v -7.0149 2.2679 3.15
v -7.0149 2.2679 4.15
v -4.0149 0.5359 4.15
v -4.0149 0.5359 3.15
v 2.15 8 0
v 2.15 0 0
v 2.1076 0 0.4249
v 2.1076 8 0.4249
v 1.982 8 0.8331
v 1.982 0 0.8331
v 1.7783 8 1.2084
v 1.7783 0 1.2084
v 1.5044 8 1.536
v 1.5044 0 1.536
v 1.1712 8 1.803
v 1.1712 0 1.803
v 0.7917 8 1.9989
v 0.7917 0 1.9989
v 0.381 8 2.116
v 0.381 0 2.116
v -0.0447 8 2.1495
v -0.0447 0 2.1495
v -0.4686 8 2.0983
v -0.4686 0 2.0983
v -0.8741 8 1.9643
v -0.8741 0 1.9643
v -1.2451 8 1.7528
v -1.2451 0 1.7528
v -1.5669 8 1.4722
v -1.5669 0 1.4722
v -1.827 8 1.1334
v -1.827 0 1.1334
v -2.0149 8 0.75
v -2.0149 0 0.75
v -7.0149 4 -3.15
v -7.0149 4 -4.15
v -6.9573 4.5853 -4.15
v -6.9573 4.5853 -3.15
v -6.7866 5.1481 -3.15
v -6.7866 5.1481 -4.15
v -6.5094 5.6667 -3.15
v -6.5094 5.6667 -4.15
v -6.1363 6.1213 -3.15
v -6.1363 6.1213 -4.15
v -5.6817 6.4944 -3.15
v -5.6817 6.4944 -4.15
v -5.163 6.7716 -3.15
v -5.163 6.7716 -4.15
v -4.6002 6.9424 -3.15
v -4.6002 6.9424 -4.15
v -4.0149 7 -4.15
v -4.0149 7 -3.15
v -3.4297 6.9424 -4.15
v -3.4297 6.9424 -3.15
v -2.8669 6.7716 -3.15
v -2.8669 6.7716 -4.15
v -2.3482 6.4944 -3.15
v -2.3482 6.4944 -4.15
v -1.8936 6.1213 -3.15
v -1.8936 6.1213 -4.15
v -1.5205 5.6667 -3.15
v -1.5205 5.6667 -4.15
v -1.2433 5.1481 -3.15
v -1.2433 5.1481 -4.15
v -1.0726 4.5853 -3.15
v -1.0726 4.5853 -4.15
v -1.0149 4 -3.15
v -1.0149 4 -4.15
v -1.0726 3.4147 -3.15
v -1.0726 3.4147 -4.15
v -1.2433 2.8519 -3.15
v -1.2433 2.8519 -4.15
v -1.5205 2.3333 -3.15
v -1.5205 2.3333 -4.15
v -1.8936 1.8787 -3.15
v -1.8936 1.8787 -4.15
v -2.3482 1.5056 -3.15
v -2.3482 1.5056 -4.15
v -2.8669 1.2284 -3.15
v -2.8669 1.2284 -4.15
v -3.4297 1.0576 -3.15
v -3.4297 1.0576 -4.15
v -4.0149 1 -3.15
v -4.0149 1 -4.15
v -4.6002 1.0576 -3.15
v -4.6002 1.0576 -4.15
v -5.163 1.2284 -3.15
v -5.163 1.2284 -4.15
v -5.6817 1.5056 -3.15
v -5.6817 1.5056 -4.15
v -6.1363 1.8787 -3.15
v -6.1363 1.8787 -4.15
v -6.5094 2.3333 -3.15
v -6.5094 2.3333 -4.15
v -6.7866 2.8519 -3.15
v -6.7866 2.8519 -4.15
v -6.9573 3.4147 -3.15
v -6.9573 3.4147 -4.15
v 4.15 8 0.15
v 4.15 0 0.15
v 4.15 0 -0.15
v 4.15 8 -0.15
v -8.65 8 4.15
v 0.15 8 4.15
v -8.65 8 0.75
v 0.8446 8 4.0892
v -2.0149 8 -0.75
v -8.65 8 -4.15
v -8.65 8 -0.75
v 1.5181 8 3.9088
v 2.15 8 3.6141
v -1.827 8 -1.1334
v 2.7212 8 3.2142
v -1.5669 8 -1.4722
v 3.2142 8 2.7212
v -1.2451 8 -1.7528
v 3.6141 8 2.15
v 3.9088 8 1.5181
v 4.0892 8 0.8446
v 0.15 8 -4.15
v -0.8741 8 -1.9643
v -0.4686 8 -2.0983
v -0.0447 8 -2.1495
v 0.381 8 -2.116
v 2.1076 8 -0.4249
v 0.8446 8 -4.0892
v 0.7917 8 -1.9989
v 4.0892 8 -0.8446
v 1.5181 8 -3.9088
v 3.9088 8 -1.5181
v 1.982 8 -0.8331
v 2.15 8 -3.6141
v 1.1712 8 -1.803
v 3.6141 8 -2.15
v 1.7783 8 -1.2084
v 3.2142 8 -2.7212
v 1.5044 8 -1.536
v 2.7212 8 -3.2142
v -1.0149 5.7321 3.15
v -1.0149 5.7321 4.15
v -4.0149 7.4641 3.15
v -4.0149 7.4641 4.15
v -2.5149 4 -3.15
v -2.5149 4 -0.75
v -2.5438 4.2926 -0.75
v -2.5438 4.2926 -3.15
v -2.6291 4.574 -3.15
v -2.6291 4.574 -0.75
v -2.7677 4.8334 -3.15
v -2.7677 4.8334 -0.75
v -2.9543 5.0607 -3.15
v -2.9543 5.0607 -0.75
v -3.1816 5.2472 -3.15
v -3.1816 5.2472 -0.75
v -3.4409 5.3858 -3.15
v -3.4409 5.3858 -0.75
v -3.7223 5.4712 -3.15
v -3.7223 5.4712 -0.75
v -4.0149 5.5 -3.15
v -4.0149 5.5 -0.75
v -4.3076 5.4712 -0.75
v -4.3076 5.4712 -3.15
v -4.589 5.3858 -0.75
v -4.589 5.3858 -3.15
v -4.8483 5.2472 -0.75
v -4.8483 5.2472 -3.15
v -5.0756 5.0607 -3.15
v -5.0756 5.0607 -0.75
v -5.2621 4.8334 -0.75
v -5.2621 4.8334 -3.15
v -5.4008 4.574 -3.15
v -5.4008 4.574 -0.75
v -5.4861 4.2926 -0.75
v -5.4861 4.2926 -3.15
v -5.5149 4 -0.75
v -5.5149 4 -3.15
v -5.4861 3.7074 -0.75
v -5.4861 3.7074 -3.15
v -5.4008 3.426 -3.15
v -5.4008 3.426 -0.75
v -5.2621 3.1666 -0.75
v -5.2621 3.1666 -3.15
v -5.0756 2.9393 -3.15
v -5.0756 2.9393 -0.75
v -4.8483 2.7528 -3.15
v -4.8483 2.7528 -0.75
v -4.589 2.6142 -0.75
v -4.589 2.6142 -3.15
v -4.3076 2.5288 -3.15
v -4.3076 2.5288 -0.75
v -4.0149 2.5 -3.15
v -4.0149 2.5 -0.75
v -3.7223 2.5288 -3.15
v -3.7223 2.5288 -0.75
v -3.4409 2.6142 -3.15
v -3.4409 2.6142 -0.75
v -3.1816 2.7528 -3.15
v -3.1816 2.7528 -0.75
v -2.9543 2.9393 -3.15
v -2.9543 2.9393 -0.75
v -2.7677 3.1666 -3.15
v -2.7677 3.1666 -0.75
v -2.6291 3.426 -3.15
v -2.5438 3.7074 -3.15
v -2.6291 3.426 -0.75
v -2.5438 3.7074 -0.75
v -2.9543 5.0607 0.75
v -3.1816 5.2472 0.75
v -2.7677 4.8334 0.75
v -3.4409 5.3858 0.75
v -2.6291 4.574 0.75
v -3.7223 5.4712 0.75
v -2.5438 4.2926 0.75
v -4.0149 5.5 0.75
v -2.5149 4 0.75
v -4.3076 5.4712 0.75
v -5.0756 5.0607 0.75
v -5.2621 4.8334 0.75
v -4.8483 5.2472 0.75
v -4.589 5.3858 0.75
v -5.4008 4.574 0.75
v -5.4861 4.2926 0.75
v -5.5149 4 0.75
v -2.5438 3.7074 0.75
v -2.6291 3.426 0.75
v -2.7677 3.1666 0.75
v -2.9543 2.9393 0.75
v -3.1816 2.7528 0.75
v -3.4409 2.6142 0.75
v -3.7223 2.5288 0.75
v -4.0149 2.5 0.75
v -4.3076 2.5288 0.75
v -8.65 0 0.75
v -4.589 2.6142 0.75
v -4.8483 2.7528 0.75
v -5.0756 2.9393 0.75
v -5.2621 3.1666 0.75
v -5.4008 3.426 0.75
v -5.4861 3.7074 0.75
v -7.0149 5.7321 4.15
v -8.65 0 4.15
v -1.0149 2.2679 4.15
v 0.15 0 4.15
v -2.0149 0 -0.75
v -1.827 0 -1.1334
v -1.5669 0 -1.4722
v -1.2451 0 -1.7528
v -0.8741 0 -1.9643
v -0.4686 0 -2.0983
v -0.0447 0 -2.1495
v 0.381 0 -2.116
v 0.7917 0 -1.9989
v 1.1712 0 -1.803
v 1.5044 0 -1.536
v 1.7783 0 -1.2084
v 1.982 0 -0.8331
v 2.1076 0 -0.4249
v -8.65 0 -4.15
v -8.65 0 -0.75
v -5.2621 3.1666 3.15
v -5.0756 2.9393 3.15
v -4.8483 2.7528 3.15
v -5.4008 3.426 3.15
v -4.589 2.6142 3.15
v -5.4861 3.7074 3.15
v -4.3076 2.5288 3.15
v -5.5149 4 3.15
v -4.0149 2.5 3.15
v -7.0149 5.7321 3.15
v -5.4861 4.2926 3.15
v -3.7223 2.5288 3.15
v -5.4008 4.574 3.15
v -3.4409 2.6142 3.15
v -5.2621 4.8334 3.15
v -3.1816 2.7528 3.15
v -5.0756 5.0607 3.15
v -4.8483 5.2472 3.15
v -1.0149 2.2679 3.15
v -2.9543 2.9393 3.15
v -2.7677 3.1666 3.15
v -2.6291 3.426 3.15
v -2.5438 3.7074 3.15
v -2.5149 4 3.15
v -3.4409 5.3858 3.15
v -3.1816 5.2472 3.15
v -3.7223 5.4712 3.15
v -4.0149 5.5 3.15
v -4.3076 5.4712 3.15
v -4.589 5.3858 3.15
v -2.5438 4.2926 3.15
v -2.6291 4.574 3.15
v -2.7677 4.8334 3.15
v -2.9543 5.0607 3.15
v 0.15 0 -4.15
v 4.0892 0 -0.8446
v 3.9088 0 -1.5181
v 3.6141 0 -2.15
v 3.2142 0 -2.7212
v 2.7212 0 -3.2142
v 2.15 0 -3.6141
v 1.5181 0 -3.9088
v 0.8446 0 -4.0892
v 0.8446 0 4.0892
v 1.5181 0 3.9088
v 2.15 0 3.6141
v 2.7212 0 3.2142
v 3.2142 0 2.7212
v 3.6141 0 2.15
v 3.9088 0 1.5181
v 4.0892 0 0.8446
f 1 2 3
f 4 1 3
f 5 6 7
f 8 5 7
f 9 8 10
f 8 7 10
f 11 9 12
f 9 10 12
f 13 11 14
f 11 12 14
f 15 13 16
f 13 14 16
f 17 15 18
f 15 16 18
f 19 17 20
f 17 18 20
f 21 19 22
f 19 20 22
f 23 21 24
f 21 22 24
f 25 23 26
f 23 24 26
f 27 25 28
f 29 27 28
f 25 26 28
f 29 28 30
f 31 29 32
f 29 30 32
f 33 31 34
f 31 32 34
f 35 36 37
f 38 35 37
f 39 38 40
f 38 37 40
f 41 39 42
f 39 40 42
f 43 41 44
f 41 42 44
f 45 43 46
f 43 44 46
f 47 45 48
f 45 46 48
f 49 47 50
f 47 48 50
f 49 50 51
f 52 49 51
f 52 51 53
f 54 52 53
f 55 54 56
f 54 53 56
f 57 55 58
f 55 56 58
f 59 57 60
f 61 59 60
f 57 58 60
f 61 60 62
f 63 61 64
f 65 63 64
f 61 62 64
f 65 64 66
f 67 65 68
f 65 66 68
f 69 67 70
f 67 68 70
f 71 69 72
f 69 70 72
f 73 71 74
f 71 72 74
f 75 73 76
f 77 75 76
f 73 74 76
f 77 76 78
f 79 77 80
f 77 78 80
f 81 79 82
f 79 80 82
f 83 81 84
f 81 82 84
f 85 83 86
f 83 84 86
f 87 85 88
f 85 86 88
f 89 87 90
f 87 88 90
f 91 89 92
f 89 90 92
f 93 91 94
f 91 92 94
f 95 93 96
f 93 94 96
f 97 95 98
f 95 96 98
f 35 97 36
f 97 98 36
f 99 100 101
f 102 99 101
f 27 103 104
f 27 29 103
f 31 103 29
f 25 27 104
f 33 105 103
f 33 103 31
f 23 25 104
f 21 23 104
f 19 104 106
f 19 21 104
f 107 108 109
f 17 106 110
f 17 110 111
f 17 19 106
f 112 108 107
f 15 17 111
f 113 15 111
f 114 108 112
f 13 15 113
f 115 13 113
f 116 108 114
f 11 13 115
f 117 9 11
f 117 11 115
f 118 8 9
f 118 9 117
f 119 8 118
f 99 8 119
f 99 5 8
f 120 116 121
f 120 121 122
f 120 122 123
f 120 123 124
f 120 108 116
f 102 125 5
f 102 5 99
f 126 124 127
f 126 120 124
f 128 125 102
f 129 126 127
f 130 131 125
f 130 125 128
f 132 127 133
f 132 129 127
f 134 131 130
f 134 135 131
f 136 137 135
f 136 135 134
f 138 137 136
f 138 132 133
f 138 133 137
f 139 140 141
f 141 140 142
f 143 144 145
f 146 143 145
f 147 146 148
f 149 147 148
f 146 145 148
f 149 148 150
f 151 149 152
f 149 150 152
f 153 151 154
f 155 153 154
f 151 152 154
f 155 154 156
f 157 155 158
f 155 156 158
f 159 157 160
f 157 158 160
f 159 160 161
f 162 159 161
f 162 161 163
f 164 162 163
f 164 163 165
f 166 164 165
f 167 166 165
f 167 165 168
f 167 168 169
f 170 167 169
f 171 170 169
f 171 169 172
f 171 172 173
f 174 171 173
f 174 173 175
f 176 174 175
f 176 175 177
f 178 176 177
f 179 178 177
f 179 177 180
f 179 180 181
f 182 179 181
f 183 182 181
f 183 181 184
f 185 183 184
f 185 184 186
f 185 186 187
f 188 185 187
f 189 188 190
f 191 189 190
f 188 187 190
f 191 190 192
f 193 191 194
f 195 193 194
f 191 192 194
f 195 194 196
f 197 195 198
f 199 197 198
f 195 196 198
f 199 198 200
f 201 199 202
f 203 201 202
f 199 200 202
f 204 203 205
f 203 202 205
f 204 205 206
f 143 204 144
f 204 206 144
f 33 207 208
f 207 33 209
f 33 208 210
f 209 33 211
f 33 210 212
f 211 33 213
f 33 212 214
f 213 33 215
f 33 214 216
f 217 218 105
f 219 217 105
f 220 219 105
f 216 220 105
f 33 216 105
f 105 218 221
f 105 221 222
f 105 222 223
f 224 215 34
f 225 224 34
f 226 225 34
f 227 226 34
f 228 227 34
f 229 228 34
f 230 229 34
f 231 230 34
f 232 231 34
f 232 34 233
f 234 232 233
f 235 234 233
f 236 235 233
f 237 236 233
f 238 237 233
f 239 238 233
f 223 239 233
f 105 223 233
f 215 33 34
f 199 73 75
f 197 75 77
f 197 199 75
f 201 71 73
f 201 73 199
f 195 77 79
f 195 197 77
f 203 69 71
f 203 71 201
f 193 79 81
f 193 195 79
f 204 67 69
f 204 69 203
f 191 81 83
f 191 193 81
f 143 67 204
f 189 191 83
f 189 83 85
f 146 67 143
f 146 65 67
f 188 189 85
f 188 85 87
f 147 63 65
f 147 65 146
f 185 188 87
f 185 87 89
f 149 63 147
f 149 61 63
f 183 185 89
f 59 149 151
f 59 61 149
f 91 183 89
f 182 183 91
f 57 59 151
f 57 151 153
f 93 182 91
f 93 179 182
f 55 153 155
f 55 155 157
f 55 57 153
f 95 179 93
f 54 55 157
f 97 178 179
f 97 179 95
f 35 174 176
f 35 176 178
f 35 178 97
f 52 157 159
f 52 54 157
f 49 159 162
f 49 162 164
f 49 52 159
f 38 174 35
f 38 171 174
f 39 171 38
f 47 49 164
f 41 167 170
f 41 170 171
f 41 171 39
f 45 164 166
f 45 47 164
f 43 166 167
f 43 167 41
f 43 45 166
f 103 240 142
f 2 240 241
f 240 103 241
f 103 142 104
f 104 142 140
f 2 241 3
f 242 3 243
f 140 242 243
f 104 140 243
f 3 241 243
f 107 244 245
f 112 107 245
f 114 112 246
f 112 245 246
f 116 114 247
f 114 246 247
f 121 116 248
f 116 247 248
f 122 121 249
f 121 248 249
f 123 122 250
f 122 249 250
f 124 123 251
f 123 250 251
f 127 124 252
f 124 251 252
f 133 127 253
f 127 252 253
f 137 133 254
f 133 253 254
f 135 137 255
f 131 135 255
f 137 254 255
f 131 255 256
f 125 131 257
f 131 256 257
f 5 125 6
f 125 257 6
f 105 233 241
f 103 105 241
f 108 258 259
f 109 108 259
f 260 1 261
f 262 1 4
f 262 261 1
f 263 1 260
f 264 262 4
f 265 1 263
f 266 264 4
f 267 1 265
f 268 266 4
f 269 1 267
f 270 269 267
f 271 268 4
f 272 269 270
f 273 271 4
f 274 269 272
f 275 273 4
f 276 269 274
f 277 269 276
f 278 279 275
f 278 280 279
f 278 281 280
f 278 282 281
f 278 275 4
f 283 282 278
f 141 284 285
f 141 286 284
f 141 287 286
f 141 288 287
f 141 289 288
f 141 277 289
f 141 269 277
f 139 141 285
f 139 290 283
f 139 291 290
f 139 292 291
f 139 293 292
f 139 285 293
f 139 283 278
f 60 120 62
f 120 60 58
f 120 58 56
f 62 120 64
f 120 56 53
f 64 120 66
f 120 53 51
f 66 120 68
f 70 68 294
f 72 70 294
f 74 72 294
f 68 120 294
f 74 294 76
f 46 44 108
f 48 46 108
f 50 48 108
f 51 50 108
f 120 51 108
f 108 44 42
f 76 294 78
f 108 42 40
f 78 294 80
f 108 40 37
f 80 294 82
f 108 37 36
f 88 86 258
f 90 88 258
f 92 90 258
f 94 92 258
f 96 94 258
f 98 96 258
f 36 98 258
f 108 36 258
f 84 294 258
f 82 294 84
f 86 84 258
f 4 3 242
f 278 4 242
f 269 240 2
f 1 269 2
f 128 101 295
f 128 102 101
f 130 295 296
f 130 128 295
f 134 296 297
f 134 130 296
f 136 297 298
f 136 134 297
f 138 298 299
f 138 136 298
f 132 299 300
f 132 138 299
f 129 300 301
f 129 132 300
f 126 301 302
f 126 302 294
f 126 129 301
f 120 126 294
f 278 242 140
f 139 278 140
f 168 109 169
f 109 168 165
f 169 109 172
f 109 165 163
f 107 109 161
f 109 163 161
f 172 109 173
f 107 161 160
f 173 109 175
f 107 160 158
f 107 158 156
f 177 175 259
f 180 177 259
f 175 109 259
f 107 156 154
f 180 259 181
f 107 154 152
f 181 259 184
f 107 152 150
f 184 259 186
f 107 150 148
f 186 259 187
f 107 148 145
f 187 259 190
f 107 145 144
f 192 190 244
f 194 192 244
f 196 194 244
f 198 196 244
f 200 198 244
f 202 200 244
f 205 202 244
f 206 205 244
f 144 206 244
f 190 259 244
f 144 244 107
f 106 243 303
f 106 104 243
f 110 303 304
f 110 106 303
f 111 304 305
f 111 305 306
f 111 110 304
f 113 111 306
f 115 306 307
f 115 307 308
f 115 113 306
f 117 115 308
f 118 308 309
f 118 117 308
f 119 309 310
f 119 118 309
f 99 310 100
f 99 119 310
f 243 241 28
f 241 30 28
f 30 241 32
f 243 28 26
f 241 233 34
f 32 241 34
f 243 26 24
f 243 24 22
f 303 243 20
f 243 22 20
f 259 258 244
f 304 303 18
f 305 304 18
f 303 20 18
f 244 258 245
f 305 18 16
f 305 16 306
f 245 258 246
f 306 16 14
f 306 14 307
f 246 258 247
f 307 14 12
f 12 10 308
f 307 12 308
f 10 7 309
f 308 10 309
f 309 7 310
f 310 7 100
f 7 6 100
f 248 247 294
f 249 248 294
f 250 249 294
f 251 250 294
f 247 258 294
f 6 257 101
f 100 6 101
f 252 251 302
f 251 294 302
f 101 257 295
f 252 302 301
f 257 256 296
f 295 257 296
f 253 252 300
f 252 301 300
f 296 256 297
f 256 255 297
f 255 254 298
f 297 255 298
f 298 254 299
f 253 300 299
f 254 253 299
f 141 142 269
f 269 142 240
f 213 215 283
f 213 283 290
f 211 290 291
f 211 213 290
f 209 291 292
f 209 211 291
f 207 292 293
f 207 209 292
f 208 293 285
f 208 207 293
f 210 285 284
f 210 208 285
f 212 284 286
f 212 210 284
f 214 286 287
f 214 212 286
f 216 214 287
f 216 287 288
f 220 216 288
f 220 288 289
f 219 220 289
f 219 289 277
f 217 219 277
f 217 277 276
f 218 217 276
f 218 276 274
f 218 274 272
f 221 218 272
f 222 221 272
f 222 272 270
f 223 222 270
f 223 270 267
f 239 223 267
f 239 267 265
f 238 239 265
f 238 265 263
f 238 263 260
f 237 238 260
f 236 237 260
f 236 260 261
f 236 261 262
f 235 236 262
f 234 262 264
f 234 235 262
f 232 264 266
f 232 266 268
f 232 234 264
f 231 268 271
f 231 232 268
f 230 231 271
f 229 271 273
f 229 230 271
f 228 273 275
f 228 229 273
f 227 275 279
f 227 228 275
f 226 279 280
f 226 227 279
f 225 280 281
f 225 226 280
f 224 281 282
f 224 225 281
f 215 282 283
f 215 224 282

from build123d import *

# Parameters (mm, degrees)
BOSS_EXTRUDE1_DEPTH     = 8
SKETCH2_R               = 1.5
CUT_EXTRUDE1_DEPTH      = 5.9
CUT_EXTRUDE1_DEPTH_BACK = 4.4
CUT_EXTRUDE2_START      = 4.9
SKETCH2_3_R             = 1.5
CUT_EXTRUDE2_DEPTH      = 1
SKETCH3_R               = 3
CUT_EXTRUDE3_DEPTH      = 1
FILLET1_R               = 4


with BuildPart() as part:
    # Sketch1 → Boss-Extrude1 (new body)
    with BuildSketch(Plane(origin=(0, 0, 0), x_dir=(1, 0, 0), z_dir=(0, 1, 0))):
        with BuildLine():
            Line((-8.65, -0.75), (-8.65, -4.15))
            Line((-8.65, -4.15), (4.15, -4.15))
            Line((4.15, -4.15), (4.15, 4.15))
            Line((4.15, 4.15), (-8.65, 4.15))
            Line((-8.65, 4.15), (-8.65, 0.75))
            Line((-8.65, 0.75), (-2.014944168, 0.75))
            ThreePointArc((-2.014944168, 0.75), (0.38103152, 2.115966678), (2.15, 0))
            ThreePointArc((2.15, 0), (0.38103152, -2.115966678), (-2.014944168, -0.75))
            Line((-2.014944168, -0.75), (-8.65, -0.75))
        make_face()
    extrude(amount=BOSS_EXTRUDE1_DEPTH)

    # Sketch2 → Cut-Extrude1 (cut, two sides)
    with BuildSketch(Plane.XY.offset(-0.75)) as cut_extrude1_sk:
        with Locations((-4.014944168, 4)):
            Circle(SKETCH2_R)
    extrude(amount=CUT_EXTRUDE1_DEPTH, mode=Mode.SUBTRACT)
    extrude(cut_extrude1_sk.sketch, amount=-CUT_EXTRUDE1_DEPTH_BACK, mode=Mode.SUBTRACT)

    # Sketch2<3> → Cut-Extrude2 (cut)
    with BuildSketch(Plane.XY.offset(-0.75).offset(CUT_EXTRUDE2_START)):
        Polygon((-2.014944168, 6.309401077), (-4.014944168, 7.464101615), (-7.014944168, 5.732050808), (-7.014944168, 2.267949192), (-4.014944168, 0.535898385), (-2.014944168, 1.690598923), align=None)
        with Locations((-4.014944168, 4)):
            Circle(SKETCH2_3_R, mode=Mode.SUBTRACT)
        Polygon((-1.014944168, 5.732050808), (-2.014944168, 6.309401077), (-2.014944168, 1.690598923), (-1.014944168, 2.267949192), align=None)
    extrude(amount=-CUT_EXTRUDE2_DEPTH, mode=Mode.SUBTRACT)

    # Sketch3 → Cut-Extrude3 (cut)
    with BuildSketch(Plane(origin=(0, 0, -4.15), x_dir=(-1, 0, 0), z_dir=(0, 0, -1))):
        with Locations((4.014944168, 4)):
            Circle(SKETCH3_R)
    extrude(amount=-CUT_EXTRUDE3_DEPTH, mode=Mode.SUBTRACT)

    # Fillet1
    fillet1_edges = [part.edges().sort_by_distance(p)[0] for p in [
        (4.15, 4, -4.15),
        (4.15, 4, 4.15),
    ]]
    fillet(fillet1_edges, radius=FILLET1_R)


solid = part.part
